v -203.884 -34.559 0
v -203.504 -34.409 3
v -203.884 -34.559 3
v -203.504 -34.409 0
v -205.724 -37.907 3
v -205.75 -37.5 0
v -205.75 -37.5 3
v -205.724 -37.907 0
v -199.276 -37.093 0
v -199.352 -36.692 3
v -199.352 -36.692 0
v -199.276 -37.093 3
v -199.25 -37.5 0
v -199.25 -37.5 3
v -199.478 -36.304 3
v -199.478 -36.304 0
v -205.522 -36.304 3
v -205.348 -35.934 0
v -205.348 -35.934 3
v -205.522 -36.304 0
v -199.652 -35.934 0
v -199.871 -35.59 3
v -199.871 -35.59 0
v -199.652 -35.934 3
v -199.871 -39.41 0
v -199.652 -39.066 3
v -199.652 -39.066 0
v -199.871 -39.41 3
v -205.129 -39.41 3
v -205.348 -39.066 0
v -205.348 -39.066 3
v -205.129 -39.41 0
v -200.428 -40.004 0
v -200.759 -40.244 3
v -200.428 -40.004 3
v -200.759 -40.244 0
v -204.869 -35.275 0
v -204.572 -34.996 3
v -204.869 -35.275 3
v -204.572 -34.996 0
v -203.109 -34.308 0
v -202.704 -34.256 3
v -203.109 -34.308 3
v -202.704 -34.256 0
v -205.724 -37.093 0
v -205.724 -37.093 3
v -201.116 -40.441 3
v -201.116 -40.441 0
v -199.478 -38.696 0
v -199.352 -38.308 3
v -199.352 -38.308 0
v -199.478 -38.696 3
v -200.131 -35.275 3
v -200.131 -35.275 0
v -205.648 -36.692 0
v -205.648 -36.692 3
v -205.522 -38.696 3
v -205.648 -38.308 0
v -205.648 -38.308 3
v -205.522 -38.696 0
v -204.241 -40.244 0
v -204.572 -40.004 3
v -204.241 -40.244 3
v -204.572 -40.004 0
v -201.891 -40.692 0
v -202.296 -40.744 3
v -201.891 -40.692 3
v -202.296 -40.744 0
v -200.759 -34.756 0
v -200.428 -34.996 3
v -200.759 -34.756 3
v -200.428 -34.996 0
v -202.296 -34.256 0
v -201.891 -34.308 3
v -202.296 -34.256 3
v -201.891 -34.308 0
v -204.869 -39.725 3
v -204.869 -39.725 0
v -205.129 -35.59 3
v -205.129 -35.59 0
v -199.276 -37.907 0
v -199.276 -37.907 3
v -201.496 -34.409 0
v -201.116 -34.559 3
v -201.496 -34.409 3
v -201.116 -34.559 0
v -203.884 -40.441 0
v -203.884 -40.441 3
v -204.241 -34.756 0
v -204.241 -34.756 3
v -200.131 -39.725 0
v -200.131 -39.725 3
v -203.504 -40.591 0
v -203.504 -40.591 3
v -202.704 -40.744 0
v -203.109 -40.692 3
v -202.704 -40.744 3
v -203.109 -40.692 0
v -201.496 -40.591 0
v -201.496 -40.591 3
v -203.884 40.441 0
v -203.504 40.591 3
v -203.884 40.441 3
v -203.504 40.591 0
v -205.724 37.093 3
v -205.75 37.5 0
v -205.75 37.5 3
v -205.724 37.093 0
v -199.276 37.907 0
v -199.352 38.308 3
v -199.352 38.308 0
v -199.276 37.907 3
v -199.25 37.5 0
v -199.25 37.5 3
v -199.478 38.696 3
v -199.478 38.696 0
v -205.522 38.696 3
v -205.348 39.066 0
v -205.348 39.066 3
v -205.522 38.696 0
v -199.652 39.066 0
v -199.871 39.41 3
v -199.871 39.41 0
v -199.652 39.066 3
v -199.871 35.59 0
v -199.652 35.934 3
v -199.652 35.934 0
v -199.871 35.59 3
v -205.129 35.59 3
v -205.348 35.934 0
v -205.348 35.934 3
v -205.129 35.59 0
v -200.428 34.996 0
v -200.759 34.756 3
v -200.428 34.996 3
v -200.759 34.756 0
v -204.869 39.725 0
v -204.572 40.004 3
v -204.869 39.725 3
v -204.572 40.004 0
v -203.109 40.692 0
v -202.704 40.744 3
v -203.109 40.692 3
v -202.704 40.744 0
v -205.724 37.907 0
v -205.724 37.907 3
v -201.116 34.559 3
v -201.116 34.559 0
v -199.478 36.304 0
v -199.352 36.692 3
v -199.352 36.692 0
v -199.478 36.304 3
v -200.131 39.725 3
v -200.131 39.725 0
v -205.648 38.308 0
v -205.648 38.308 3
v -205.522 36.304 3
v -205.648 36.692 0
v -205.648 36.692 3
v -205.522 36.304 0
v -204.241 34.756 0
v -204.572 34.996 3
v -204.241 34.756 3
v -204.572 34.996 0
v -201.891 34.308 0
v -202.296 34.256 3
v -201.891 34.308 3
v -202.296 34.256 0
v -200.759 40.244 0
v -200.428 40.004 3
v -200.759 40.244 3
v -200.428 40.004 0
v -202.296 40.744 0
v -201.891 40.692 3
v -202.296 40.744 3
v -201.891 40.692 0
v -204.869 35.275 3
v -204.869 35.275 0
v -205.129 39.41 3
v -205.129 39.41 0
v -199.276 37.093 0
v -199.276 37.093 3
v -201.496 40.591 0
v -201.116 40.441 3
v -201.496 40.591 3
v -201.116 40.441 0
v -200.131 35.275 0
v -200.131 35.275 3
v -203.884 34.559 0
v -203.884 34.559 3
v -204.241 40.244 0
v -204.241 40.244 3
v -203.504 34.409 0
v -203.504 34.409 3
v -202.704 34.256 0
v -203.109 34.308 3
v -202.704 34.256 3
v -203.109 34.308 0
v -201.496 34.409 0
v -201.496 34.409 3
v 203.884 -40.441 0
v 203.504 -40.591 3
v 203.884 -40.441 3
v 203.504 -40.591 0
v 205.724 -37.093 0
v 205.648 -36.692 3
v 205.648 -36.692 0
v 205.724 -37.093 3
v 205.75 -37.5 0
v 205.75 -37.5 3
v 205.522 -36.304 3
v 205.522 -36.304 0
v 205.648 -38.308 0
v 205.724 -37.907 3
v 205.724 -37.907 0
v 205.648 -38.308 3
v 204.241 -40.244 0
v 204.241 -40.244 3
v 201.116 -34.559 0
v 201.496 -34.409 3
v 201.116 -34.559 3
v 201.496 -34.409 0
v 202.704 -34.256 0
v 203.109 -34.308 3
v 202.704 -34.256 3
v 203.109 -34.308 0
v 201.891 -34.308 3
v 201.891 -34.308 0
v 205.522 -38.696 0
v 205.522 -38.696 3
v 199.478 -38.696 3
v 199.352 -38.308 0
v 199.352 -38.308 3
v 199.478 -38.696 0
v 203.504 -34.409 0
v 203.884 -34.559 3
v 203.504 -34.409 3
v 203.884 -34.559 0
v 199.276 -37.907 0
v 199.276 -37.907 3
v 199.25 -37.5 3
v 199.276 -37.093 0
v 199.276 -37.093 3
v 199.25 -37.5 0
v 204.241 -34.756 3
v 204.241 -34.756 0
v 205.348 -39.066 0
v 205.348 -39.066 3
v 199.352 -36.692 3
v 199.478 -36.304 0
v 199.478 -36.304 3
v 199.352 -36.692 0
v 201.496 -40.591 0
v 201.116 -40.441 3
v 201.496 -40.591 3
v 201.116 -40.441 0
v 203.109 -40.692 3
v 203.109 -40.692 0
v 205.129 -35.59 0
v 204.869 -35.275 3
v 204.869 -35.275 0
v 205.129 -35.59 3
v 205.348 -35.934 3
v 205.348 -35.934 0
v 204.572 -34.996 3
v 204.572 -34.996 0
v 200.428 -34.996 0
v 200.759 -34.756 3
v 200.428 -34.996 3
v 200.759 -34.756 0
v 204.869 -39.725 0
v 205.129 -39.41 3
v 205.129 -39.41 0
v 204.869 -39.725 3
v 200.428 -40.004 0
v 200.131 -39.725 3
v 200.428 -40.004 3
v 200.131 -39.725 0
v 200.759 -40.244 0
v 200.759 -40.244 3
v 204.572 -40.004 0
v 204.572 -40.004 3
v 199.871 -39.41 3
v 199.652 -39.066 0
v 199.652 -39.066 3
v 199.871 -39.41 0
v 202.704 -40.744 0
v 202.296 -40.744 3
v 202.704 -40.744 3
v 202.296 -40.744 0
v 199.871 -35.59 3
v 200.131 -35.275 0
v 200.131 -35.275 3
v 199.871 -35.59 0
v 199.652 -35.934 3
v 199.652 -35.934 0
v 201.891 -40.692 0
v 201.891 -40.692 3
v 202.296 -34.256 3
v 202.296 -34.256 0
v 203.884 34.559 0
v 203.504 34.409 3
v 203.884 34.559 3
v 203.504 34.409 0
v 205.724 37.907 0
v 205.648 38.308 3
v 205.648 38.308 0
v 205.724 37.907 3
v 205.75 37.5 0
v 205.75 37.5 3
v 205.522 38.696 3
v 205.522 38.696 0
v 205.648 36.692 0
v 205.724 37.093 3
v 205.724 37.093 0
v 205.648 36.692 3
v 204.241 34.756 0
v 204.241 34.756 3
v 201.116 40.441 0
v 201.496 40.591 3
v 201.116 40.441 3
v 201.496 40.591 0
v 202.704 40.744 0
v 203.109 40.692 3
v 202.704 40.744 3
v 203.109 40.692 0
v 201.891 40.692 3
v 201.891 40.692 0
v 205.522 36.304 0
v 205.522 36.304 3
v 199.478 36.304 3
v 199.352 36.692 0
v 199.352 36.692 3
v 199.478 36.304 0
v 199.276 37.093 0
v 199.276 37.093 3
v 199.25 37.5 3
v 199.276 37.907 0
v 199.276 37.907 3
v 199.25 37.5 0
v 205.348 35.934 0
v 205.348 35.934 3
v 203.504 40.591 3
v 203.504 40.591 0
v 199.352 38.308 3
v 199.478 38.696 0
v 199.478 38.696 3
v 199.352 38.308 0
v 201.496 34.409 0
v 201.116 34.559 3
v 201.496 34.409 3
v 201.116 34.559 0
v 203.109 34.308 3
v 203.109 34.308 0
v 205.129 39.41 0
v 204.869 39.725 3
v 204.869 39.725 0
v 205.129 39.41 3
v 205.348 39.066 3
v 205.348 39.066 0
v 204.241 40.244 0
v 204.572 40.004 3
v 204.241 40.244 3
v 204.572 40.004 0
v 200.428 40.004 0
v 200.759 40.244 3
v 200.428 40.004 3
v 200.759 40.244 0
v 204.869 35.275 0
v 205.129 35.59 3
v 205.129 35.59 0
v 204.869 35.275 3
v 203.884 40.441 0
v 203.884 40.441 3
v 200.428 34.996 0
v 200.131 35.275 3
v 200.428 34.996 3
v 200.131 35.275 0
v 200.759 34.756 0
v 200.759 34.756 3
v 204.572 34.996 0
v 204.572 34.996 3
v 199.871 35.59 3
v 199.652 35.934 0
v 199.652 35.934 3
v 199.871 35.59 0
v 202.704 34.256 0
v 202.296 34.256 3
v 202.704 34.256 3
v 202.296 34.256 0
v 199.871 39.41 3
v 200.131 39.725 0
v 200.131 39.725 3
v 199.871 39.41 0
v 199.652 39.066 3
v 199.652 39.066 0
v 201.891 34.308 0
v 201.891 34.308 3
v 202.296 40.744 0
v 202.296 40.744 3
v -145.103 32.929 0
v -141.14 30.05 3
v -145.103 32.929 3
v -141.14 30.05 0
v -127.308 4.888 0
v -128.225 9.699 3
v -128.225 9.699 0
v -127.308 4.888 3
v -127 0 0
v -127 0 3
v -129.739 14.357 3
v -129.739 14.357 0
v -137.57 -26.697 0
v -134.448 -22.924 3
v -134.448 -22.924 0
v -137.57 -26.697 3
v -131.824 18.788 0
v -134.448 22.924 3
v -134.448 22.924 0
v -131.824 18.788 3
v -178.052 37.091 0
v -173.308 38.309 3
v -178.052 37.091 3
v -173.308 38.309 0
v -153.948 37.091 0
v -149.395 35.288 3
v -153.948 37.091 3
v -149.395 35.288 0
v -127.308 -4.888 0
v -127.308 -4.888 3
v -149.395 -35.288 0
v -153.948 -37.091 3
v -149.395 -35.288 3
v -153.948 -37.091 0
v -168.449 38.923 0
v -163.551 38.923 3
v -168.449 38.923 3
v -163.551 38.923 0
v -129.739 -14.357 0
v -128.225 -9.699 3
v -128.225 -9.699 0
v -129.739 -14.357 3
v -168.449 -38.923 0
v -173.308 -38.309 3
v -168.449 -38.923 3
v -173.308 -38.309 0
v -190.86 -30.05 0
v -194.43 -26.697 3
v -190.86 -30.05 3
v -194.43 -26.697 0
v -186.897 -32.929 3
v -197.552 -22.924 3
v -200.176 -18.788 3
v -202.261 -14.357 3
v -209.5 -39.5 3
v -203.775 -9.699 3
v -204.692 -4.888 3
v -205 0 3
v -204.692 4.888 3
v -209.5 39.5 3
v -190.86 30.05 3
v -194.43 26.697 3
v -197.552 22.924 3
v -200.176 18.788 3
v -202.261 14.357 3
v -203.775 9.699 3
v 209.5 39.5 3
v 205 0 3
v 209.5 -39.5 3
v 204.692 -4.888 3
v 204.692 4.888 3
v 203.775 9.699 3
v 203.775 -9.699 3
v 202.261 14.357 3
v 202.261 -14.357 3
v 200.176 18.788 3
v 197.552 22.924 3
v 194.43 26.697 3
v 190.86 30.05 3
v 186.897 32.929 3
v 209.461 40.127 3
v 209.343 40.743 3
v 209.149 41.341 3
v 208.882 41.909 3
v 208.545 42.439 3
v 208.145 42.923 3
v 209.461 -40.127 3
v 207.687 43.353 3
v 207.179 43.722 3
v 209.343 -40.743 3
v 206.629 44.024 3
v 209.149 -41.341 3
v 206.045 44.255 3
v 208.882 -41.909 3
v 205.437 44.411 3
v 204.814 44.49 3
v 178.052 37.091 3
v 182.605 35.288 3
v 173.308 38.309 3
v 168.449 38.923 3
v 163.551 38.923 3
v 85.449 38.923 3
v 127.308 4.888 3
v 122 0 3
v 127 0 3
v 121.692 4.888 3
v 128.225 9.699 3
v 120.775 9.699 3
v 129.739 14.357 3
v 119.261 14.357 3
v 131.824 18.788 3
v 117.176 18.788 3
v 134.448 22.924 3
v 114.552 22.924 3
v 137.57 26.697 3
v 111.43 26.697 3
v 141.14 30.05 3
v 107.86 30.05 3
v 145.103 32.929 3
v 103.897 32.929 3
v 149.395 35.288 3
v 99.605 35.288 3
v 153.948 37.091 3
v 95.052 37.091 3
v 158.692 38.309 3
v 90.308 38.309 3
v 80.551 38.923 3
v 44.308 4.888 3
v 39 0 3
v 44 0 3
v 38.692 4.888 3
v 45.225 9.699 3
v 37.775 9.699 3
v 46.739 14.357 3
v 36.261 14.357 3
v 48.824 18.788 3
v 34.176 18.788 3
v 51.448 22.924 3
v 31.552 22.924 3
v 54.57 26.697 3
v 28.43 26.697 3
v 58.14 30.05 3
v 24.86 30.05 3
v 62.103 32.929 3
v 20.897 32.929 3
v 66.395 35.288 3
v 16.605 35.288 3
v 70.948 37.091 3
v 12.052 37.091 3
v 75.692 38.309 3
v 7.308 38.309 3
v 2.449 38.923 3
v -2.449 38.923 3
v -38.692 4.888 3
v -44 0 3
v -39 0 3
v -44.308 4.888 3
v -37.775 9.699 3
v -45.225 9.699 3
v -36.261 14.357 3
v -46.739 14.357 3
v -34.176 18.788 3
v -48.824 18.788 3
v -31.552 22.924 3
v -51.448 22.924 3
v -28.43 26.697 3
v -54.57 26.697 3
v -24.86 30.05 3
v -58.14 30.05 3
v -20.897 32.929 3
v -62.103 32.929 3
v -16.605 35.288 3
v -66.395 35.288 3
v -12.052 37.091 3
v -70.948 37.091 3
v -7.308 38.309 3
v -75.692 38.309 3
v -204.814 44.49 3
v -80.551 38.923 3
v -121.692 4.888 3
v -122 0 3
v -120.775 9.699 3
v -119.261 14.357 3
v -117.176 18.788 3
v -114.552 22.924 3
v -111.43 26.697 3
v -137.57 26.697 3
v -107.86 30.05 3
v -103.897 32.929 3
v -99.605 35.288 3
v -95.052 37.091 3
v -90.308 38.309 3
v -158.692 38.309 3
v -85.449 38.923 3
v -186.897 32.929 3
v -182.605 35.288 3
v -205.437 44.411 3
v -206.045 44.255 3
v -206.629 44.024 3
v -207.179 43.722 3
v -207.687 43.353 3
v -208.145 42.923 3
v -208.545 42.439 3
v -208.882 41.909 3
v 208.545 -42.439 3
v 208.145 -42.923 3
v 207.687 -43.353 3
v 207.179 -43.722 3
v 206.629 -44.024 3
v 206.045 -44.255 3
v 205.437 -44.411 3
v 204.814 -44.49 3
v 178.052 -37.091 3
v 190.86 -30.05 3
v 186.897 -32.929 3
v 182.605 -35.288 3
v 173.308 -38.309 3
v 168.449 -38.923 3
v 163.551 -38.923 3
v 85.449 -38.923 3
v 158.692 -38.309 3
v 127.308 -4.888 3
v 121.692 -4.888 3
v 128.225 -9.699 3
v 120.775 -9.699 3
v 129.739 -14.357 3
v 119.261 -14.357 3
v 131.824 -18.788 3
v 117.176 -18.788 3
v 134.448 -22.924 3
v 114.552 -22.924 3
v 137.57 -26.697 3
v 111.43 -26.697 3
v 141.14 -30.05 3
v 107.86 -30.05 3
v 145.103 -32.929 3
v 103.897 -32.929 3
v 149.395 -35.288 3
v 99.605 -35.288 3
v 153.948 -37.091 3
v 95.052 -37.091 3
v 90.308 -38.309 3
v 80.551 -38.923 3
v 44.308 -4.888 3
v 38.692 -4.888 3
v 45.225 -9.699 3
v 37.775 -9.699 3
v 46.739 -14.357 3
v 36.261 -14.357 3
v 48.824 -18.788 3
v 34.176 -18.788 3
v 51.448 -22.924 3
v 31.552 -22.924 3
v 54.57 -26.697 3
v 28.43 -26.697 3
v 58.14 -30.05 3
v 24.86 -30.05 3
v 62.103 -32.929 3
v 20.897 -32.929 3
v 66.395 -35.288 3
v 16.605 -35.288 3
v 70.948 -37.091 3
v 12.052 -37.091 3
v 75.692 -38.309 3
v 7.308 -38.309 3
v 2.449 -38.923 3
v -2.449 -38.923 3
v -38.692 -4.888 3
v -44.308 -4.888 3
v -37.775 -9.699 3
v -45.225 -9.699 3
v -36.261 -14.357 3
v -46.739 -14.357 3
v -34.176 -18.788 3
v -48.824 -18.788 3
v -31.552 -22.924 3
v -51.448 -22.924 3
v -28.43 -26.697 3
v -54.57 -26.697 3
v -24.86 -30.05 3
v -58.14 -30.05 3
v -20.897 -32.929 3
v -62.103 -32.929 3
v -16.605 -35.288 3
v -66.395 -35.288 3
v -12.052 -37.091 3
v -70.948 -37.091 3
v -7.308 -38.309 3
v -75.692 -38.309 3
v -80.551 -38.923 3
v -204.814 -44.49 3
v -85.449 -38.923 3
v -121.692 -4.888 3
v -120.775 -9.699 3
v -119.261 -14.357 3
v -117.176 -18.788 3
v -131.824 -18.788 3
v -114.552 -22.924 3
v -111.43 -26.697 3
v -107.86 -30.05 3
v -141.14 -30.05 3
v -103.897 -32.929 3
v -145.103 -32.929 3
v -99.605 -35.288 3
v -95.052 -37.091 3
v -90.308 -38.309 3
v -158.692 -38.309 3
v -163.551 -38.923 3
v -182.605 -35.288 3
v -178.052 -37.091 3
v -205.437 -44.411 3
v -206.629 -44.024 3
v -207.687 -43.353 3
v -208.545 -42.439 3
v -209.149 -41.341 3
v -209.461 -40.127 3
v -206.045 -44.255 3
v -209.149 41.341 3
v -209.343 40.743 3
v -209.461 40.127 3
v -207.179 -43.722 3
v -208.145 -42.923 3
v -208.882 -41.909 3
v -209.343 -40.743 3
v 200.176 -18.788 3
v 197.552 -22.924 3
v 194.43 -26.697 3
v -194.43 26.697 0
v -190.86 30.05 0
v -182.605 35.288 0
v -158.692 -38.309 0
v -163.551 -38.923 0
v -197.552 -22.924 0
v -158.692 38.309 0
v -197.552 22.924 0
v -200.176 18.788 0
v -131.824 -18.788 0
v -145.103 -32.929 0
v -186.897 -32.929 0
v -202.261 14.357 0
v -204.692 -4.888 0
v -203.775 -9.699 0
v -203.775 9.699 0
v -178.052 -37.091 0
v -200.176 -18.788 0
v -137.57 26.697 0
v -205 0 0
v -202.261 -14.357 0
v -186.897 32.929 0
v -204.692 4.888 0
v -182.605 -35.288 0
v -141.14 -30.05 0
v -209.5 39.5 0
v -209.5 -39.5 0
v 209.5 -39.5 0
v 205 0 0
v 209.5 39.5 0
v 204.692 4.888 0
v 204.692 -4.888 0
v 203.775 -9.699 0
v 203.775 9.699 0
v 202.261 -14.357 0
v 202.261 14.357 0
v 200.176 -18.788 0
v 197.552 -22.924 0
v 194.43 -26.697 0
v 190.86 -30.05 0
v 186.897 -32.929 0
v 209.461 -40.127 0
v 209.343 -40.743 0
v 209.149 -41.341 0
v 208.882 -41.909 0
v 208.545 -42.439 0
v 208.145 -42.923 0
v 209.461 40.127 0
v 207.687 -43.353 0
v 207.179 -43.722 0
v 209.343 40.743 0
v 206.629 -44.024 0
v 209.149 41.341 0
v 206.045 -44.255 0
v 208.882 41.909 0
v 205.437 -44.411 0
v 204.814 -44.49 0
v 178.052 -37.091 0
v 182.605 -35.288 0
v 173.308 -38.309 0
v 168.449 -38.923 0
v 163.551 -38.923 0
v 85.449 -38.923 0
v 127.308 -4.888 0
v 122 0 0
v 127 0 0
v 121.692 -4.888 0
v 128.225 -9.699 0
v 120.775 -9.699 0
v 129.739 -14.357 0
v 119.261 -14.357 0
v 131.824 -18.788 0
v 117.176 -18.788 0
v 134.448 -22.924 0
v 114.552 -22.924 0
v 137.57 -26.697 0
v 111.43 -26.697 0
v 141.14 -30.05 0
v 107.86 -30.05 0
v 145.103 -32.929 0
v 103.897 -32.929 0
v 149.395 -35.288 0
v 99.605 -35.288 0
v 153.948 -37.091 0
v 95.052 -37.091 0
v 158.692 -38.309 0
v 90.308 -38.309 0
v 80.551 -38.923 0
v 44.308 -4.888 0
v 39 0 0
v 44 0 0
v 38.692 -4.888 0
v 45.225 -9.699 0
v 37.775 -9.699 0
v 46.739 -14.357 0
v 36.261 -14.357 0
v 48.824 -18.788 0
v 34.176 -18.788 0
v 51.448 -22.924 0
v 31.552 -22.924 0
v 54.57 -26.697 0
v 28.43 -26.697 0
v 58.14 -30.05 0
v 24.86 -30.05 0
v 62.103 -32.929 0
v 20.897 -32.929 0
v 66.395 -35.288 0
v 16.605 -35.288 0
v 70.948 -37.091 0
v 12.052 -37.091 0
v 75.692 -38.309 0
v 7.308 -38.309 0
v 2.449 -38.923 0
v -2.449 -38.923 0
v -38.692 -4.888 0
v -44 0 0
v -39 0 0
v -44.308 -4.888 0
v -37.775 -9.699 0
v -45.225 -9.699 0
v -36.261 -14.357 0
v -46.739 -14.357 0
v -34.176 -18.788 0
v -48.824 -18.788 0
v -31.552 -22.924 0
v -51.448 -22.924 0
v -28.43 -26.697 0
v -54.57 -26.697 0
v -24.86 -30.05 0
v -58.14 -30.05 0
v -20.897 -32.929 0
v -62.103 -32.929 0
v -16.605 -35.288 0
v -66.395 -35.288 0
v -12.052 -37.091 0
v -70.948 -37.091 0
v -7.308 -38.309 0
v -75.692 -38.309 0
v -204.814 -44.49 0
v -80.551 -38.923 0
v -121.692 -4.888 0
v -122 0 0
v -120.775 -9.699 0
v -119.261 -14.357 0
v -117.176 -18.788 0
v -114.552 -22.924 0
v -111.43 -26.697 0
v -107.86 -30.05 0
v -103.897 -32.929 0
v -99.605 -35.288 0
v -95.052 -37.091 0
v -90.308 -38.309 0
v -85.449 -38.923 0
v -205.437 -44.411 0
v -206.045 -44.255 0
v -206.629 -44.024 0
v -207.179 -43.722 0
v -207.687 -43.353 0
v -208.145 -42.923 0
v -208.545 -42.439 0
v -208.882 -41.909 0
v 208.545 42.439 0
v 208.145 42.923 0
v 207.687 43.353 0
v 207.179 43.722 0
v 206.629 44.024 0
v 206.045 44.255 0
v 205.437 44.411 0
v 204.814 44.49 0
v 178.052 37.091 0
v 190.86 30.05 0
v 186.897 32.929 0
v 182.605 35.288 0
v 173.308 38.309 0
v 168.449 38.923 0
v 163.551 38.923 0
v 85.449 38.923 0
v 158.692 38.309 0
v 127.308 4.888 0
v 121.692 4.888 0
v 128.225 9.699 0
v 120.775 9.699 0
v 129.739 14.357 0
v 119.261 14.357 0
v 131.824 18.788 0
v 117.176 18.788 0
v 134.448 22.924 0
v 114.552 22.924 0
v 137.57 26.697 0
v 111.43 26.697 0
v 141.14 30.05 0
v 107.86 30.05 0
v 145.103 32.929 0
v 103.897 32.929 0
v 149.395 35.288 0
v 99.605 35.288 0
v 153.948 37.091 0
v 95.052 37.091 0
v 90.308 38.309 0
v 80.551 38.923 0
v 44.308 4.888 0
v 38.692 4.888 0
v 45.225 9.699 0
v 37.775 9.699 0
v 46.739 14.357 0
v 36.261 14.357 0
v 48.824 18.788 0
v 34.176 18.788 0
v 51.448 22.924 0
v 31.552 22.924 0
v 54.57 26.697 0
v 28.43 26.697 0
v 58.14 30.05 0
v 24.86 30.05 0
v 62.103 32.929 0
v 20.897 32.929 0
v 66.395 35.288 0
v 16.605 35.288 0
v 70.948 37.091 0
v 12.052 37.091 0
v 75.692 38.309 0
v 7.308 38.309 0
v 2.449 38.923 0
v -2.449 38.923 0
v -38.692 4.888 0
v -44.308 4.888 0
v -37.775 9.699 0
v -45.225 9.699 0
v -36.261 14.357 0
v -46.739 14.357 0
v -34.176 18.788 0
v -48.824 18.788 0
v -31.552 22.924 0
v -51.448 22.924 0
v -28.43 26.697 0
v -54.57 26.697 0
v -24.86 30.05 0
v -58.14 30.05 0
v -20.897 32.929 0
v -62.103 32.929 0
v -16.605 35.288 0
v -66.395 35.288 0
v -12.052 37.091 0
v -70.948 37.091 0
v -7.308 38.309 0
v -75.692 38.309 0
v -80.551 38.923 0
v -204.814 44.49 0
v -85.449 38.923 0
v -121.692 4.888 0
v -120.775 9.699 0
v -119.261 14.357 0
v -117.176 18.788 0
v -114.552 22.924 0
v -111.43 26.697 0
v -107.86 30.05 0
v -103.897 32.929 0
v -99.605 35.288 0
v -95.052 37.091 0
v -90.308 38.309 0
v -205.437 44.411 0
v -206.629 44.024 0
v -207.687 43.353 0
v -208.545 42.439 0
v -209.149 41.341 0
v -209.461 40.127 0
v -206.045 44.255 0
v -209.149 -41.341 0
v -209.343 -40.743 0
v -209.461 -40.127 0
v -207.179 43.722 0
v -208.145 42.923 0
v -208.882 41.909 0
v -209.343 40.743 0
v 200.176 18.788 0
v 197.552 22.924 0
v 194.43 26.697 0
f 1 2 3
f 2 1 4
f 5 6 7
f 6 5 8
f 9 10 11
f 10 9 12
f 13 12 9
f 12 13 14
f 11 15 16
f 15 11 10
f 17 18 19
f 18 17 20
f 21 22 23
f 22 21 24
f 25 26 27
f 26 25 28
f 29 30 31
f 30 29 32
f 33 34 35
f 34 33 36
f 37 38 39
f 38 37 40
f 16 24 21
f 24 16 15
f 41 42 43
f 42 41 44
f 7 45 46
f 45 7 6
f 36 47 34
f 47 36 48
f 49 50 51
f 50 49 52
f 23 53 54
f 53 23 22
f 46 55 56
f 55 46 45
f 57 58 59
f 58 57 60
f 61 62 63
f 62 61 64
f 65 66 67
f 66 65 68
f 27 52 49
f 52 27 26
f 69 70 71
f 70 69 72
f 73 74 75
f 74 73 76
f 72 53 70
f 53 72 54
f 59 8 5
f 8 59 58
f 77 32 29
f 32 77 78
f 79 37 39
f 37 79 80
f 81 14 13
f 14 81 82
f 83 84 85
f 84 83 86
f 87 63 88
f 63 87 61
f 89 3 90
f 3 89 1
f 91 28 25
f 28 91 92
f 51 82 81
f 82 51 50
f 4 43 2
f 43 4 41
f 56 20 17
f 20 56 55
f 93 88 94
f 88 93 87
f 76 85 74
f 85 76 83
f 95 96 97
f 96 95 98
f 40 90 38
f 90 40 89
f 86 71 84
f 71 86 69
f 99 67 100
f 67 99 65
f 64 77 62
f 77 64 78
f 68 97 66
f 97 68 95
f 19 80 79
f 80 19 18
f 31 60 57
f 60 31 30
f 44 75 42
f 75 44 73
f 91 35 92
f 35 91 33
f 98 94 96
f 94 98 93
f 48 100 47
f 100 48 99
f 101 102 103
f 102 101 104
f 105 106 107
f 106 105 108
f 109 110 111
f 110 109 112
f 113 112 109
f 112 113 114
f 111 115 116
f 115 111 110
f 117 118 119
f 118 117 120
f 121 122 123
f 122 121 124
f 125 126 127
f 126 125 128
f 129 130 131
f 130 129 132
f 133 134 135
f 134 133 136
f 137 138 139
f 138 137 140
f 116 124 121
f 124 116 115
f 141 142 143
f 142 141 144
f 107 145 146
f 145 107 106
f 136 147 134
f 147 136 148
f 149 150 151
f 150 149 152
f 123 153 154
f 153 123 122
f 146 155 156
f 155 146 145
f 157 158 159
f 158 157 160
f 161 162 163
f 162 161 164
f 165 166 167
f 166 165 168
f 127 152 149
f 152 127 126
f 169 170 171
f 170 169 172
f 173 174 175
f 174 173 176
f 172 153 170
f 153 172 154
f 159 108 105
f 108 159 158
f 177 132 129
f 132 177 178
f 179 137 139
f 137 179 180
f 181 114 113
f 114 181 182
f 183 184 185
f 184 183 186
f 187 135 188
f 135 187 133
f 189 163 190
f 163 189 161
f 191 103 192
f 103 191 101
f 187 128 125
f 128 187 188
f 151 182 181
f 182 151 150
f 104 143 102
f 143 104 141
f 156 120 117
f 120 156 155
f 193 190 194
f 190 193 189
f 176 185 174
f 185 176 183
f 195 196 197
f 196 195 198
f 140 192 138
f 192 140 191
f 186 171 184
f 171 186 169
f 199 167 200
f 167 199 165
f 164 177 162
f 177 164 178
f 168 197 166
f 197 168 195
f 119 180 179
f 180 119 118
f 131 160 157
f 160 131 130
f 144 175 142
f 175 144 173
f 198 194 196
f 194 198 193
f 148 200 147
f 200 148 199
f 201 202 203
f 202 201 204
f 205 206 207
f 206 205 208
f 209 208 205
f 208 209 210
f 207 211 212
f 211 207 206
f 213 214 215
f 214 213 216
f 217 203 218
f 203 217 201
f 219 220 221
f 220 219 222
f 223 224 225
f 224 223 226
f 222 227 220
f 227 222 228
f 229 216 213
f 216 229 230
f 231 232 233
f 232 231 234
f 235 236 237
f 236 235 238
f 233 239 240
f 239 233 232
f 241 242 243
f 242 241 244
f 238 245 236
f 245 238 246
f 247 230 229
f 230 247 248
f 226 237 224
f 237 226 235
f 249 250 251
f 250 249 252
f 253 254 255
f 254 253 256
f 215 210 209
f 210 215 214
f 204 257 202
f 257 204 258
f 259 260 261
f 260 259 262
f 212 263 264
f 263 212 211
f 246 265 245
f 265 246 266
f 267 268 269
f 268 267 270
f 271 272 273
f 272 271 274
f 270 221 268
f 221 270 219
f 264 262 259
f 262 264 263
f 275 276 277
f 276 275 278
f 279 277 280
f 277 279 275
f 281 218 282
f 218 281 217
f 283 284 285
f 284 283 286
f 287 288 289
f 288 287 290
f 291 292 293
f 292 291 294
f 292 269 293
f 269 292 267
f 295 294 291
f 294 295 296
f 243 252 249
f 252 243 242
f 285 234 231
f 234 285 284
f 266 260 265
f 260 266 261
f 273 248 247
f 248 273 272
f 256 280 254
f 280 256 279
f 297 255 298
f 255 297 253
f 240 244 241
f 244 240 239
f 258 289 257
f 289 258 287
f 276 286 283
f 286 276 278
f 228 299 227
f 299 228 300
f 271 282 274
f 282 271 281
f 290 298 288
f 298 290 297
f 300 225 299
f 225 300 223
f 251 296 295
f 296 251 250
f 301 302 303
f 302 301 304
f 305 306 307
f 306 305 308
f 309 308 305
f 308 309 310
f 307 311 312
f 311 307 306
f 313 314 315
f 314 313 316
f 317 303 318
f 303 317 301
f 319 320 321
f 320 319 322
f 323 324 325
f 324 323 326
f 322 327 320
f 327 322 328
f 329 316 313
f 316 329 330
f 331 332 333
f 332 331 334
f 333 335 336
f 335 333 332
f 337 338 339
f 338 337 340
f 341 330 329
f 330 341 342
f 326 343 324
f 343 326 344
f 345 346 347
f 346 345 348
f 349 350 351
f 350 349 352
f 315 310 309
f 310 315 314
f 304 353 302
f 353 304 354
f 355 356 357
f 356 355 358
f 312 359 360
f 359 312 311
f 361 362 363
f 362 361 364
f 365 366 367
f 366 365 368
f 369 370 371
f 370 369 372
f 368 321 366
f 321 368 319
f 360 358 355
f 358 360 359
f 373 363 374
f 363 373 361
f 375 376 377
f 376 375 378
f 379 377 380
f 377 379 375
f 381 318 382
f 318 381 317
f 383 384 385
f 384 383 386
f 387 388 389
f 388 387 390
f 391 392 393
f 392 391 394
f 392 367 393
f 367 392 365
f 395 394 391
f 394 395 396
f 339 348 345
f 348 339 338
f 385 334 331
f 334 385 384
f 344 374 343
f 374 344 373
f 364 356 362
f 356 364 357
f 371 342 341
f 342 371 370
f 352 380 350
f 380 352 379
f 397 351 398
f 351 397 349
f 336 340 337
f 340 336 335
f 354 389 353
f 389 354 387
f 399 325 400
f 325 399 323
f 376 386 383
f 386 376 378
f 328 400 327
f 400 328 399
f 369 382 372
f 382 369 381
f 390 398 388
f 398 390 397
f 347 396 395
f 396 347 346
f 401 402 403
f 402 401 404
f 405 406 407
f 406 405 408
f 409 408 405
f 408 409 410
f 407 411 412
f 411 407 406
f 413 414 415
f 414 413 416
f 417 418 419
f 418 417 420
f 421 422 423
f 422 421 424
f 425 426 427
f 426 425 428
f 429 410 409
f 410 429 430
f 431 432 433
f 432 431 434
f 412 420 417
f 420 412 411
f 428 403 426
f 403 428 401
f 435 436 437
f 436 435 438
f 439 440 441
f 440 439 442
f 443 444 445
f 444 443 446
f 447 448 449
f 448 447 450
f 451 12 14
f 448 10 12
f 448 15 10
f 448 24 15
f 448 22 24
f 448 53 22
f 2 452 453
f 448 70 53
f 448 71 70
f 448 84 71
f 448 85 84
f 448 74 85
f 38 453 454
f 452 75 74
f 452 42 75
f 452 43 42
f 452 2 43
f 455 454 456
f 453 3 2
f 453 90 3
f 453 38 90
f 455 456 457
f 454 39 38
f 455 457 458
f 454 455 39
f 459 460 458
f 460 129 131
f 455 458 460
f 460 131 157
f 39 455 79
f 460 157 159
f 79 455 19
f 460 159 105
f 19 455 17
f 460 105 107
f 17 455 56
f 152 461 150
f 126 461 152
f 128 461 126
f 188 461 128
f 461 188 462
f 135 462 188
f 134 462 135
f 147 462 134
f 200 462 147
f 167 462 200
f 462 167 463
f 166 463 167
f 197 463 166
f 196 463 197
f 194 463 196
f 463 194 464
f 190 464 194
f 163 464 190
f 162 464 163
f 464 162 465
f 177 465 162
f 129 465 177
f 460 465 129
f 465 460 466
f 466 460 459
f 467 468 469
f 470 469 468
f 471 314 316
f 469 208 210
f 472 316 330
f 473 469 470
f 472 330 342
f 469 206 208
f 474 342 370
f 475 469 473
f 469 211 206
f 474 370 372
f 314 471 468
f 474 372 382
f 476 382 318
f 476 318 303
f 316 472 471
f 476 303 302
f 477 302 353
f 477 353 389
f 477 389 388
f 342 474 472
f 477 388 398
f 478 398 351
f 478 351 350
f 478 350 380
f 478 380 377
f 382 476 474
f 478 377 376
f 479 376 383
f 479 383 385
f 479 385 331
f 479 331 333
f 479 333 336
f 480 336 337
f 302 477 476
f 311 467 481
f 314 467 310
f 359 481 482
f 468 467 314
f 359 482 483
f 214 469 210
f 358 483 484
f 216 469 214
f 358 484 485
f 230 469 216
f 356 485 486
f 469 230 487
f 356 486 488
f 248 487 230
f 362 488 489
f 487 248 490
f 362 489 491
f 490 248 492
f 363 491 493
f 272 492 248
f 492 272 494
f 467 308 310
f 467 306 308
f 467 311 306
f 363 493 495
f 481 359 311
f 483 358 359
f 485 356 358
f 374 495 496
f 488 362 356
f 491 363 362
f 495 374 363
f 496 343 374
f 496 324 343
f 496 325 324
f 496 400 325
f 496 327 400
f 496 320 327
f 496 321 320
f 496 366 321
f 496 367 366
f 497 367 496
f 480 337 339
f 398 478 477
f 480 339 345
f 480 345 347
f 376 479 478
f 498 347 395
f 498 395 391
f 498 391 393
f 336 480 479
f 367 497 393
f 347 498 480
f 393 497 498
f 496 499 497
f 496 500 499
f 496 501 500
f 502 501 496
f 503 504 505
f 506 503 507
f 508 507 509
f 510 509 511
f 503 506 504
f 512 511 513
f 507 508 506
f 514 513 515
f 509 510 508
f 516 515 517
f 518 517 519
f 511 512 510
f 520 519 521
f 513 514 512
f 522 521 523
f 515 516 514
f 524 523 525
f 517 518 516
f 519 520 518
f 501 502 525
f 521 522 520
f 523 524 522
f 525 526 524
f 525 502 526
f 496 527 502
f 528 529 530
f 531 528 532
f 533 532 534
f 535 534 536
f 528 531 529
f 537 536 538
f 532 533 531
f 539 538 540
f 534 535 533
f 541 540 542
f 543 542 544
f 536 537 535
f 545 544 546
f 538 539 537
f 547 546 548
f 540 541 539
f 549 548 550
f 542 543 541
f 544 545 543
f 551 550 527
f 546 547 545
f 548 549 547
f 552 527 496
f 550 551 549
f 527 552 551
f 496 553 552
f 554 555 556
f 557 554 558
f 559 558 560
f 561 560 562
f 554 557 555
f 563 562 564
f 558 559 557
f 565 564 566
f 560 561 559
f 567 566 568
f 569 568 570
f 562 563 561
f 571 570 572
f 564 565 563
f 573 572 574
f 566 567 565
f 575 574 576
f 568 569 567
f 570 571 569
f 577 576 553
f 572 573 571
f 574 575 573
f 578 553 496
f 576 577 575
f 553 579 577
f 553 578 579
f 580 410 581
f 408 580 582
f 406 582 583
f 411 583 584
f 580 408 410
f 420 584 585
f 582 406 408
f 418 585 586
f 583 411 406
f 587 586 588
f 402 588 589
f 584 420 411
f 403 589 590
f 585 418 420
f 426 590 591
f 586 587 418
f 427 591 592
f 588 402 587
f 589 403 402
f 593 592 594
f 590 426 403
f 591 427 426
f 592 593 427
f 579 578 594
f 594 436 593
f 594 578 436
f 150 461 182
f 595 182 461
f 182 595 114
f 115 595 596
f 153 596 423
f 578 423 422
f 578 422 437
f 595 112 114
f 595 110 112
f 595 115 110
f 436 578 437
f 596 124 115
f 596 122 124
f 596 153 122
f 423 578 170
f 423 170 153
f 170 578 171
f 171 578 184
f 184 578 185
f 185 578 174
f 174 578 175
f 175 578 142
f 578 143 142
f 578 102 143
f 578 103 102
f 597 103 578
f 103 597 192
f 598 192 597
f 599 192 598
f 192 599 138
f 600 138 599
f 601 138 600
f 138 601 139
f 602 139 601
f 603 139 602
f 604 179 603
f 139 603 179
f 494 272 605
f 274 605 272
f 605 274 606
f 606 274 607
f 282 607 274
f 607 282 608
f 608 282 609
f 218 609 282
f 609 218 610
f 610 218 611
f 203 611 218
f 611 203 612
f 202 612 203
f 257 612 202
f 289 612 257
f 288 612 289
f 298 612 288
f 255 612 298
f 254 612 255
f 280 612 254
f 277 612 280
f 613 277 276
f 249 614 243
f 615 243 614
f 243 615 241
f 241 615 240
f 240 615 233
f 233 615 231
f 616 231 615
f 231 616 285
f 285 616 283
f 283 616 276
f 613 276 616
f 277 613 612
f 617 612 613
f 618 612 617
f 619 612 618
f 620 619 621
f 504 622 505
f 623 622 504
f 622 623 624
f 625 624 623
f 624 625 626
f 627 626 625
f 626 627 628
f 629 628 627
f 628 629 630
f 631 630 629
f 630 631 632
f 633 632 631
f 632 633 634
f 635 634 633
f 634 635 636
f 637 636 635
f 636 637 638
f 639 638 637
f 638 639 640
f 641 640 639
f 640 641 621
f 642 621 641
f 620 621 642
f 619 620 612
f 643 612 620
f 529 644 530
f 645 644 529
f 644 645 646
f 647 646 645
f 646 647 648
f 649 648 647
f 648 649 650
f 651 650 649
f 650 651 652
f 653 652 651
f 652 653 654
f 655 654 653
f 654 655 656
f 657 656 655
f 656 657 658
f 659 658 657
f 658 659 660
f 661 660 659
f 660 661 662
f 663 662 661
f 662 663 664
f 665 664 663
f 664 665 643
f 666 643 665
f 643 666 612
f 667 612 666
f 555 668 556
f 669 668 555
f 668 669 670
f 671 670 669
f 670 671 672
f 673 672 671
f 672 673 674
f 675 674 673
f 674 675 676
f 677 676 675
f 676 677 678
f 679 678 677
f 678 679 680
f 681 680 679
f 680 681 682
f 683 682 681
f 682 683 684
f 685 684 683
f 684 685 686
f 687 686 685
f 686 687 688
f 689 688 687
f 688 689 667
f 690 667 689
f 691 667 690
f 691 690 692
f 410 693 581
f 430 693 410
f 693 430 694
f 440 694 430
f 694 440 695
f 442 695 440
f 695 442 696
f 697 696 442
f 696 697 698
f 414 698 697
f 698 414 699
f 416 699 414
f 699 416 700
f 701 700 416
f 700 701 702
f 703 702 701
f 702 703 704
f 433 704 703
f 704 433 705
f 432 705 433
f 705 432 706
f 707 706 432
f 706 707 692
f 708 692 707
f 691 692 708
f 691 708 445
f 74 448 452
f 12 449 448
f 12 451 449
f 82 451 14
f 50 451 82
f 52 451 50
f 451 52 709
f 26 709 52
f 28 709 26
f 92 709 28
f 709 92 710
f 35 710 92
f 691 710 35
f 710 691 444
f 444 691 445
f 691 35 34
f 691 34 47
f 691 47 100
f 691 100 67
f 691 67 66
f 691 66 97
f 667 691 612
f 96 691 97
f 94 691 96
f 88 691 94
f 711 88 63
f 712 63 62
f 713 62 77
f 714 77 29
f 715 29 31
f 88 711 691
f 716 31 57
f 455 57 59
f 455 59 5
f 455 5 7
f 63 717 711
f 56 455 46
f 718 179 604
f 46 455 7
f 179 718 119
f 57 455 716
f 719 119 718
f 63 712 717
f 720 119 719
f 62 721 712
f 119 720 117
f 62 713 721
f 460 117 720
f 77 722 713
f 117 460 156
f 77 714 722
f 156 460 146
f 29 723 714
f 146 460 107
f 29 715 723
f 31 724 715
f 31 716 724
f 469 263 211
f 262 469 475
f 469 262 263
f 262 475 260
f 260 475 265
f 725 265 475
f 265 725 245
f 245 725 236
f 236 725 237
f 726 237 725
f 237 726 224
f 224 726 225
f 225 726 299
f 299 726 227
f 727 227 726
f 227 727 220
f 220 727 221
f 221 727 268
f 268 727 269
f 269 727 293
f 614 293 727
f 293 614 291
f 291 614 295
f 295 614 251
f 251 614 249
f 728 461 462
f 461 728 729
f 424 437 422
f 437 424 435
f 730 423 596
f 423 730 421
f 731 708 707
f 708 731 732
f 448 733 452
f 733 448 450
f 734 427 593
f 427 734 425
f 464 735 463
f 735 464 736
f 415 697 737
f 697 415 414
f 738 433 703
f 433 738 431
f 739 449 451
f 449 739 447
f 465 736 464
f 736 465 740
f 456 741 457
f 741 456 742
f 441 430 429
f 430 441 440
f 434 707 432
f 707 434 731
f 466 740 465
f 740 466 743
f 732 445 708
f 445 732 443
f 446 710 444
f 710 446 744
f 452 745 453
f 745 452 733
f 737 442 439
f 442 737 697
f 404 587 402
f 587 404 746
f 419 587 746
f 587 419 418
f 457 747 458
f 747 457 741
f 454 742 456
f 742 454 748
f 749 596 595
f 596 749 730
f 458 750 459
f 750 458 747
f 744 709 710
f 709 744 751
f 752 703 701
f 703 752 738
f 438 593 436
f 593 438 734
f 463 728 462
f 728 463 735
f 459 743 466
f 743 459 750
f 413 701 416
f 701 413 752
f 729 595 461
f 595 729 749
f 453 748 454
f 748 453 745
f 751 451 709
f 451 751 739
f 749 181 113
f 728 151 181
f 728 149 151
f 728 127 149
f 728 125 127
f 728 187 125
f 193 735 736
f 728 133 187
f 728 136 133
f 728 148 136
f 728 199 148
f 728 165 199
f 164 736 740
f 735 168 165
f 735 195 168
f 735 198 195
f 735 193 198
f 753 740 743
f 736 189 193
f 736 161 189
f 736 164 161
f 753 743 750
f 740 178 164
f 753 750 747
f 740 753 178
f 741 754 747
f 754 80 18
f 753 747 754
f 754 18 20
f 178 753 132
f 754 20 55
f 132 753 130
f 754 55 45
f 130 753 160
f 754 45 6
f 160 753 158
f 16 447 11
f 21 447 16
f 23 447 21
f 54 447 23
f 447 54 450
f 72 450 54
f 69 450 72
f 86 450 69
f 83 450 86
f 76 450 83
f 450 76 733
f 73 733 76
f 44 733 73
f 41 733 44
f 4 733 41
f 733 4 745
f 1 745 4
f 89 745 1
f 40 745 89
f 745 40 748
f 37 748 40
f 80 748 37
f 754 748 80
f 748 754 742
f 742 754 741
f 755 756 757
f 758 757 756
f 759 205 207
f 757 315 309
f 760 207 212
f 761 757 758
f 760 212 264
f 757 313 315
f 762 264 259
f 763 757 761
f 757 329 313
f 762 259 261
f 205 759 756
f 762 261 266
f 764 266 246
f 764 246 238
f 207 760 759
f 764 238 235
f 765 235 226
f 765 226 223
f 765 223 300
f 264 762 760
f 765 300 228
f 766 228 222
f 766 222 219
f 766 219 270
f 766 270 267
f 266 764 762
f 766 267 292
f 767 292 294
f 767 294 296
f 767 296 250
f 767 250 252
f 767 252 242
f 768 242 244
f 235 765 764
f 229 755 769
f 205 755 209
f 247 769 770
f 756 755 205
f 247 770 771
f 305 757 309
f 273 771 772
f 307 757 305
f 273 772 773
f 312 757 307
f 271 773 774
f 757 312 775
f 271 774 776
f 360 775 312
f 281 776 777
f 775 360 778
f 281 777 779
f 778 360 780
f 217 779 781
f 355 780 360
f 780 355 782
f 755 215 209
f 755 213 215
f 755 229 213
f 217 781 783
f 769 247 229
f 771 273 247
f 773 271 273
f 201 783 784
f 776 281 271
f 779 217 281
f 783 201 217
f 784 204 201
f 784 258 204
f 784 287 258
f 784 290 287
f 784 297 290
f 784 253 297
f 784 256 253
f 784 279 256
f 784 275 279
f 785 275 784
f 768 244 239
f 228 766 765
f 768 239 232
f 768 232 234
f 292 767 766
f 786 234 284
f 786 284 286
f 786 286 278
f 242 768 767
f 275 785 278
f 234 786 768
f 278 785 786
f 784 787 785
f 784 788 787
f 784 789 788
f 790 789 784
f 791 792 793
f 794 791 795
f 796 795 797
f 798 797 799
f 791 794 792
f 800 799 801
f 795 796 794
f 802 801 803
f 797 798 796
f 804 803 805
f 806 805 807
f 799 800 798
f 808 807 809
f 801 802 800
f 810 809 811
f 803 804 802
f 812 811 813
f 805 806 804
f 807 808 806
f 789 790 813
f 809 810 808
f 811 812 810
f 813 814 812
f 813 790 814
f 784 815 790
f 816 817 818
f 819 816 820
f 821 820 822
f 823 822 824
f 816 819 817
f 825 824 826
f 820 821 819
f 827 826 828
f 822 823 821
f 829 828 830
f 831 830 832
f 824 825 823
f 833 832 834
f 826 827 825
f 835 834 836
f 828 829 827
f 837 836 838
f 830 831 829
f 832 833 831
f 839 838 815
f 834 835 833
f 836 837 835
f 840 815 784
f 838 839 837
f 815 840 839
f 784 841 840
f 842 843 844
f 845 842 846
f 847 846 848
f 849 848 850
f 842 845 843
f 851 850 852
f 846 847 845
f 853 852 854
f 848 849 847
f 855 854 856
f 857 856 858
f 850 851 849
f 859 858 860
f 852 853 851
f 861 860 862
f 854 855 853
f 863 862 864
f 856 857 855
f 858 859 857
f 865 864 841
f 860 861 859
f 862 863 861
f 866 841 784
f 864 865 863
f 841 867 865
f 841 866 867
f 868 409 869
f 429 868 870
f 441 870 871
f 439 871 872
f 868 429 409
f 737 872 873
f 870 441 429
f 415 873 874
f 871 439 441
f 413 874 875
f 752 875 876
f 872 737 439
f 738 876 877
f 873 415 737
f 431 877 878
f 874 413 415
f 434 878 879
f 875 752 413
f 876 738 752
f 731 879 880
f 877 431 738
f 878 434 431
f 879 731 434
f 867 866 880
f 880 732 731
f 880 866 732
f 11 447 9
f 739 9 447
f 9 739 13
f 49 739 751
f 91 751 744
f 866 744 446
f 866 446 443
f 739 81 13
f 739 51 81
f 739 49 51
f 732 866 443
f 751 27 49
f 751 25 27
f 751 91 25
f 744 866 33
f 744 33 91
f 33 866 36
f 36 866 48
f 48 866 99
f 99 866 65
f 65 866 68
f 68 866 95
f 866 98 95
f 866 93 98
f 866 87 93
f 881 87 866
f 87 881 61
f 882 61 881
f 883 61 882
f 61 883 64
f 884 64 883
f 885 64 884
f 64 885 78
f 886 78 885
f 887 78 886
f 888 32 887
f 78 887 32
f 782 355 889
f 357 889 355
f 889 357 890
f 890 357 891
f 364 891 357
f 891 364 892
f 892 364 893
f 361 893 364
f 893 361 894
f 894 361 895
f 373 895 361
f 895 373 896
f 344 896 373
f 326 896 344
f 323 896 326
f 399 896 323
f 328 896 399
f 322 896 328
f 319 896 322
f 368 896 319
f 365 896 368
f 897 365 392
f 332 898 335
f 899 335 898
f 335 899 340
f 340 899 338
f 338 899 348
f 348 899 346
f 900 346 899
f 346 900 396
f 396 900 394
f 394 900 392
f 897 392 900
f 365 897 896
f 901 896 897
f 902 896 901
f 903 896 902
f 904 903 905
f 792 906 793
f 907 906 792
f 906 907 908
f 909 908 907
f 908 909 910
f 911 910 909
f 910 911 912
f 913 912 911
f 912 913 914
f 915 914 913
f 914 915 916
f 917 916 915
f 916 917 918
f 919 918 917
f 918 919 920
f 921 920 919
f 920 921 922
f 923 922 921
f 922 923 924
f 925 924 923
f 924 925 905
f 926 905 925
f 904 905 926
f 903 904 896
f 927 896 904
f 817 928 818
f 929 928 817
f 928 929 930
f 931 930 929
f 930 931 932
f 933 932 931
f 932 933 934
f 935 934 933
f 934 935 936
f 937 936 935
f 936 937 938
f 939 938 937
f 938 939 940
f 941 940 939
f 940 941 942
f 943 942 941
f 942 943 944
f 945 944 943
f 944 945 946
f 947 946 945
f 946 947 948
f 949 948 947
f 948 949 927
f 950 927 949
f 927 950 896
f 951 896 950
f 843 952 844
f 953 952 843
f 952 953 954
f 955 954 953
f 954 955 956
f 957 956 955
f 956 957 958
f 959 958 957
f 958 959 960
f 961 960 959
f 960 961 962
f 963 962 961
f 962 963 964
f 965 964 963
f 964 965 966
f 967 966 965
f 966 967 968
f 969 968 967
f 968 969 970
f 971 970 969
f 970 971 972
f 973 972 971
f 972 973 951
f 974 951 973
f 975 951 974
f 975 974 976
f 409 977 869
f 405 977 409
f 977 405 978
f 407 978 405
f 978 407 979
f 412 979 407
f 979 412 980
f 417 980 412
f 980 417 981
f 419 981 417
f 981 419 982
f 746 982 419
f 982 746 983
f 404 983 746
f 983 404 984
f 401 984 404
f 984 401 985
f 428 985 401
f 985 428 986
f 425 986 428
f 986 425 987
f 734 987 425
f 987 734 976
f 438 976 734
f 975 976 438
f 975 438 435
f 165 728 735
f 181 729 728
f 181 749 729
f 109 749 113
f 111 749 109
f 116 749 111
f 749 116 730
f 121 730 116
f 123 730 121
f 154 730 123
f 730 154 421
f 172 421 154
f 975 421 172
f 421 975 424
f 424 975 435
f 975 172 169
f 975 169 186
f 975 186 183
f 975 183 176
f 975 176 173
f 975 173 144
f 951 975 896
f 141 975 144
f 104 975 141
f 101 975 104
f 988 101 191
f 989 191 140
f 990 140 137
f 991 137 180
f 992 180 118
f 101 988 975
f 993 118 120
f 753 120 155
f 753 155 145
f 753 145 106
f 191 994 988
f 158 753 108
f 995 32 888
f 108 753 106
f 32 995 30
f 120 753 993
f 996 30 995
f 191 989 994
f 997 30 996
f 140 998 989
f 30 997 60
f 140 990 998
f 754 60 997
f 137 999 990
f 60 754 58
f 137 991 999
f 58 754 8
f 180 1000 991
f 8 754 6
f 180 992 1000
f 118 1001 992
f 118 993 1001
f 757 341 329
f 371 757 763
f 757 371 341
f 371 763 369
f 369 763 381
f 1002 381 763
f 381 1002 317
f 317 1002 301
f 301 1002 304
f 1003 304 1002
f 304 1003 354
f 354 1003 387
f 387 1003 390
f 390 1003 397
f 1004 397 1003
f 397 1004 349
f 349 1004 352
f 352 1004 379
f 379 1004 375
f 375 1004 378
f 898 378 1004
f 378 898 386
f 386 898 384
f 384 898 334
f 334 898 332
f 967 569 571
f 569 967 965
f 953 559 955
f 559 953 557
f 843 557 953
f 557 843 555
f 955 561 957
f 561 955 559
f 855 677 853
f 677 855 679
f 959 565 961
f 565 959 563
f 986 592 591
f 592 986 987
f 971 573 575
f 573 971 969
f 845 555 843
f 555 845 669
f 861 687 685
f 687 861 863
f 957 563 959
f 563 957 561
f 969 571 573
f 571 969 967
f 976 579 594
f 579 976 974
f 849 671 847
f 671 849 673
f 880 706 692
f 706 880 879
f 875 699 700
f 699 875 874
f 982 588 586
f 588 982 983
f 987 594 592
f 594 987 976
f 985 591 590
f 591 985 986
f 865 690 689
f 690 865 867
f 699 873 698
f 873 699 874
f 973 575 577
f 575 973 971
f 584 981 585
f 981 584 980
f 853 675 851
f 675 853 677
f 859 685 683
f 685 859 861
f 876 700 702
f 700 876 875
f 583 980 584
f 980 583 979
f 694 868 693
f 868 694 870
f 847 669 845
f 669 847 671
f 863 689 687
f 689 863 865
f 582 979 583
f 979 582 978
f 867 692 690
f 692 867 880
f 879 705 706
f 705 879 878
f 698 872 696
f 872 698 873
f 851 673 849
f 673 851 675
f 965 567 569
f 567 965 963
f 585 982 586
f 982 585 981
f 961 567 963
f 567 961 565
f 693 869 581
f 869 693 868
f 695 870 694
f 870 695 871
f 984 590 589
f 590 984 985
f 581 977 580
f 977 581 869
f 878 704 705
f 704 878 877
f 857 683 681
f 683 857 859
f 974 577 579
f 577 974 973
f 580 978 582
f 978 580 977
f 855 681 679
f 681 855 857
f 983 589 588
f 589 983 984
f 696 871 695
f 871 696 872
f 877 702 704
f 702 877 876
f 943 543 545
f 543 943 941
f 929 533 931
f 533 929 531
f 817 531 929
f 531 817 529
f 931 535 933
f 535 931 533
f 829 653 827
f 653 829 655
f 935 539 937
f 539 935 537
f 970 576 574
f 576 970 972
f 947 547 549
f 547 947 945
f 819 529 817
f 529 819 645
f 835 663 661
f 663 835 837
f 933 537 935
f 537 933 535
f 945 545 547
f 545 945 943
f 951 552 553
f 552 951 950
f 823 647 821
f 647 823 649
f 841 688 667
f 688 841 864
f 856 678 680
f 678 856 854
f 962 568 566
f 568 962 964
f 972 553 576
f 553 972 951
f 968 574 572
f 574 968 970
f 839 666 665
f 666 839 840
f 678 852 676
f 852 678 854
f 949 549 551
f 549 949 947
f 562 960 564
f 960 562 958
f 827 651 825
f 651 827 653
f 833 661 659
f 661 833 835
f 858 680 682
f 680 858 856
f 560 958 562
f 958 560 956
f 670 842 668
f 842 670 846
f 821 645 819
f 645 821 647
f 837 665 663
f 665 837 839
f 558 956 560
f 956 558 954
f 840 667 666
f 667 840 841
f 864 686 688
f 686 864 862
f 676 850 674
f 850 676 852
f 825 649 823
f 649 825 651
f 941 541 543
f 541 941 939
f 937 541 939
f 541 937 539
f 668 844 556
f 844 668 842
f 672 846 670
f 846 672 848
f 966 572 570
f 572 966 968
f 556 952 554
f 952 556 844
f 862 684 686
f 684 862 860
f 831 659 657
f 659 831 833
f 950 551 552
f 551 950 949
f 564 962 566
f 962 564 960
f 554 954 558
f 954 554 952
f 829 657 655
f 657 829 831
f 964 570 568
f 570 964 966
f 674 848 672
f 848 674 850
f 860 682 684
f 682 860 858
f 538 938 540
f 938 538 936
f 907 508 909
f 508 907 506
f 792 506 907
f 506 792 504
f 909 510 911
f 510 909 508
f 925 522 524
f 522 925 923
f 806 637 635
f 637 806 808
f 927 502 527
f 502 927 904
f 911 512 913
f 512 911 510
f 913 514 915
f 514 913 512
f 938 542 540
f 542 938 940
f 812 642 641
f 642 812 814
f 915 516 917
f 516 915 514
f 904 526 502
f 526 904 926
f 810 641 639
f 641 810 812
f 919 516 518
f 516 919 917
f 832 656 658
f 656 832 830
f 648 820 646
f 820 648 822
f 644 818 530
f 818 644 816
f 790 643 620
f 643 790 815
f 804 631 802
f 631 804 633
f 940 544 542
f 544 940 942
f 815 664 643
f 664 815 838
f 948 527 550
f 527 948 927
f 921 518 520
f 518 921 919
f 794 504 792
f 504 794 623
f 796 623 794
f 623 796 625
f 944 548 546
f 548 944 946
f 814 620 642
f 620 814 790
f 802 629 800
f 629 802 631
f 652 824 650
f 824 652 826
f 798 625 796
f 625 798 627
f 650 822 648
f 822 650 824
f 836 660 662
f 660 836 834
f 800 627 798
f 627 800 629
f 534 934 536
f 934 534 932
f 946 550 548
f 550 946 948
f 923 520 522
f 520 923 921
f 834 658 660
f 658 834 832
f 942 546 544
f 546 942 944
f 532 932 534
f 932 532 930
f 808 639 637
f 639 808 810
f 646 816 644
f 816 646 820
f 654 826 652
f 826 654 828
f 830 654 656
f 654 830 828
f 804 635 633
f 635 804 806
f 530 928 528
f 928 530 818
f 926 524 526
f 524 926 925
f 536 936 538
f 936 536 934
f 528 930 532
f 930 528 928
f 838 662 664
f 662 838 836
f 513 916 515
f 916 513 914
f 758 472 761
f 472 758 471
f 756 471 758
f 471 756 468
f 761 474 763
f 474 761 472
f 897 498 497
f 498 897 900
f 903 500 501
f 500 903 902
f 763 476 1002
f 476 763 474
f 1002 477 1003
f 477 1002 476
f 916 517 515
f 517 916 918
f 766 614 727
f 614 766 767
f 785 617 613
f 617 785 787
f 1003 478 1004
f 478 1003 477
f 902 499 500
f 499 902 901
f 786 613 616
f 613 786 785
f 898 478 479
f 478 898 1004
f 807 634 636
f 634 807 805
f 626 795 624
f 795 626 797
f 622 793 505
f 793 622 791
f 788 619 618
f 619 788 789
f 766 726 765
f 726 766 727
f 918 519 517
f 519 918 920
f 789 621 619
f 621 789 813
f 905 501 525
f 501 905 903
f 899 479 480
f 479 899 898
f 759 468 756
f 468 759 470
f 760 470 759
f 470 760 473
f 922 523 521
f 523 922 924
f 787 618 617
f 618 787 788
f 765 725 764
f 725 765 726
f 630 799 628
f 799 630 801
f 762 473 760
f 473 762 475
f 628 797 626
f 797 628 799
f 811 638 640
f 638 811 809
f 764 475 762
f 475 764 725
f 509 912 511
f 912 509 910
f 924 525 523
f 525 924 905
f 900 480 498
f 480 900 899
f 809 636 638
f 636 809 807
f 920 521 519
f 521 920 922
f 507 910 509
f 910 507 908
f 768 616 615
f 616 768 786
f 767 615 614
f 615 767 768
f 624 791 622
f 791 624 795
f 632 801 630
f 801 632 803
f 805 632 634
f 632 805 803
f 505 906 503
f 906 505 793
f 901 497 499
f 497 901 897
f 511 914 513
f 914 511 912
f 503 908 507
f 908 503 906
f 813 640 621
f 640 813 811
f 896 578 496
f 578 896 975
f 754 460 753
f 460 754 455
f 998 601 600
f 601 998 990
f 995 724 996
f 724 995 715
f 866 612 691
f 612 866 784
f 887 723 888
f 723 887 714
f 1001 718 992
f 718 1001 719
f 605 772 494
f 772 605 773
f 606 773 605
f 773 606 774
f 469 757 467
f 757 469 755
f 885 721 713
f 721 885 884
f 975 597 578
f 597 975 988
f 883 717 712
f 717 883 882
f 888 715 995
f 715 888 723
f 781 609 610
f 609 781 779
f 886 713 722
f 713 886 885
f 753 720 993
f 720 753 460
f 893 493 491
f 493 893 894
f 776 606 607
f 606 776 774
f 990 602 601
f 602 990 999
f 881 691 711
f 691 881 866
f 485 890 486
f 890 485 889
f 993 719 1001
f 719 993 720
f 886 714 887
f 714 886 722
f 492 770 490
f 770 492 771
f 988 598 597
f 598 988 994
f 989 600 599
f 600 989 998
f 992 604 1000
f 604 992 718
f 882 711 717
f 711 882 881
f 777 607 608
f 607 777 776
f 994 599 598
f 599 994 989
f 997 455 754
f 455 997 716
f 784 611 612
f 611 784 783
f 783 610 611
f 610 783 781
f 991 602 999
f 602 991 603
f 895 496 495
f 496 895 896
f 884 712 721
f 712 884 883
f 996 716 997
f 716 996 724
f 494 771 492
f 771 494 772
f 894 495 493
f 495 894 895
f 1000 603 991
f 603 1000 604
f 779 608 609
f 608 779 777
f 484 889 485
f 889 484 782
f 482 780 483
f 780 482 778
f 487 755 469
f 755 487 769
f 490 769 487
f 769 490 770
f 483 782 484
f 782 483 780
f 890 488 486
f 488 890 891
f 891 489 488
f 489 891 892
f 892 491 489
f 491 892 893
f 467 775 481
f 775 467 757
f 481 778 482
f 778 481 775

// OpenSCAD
$fn = 50;


difference() {
	union() {
		hull() {
			translate(v = [-204.5000000000, 39.5000000000, 0]) {
				cylinder(h = 3, r = 5);
			}
			translate(v = [204.5000000000, 39.5000000000, 0]) {
				cylinder(h = 3, r = 5);
			}
			translate(v = [-204.5000000000, -39.5000000000, 0]) {
				cylinder(h = 3, r = 5);
			}
			translate(v = [204.5000000000, -39.5000000000, 0]) {
				cylinder(h = 3, r = 5);
			}
		}
	}
	union() {
		#translate(v = [-202.5000000000, -37.5000000000, -100.0000000000]) {
			cylinder(h = 200, r = 3.2500000000);
		}
		#translate(v = [-202.5000000000, 37.5000000000, -100.0000000000]) {
			cylinder(h = 200, r = 3.2500000000);
		}
		#translate(v = [202.5000000000, -37.5000000000, -100.0000000000]) {
			cylinder(h = 200, r = 3.2500000000);
		}
		#translate(v = [202.5000000000, 37.5000000000, -100.0000000000]) {
			cylinder(h = 200, r = 3.2500000000);
		}
		#translate(v = [-166.0000000000, 0, 0]) {
			cylinder(h = 3, r = 39.0000000000);
		}
		#translate(v = [-83.0000000000, 0, 0]) {
			cylinder(h = 3, r = 39.0000000000);
		}
		#cylinder(h = 3, r = 39.0000000000);
		#translate(v = [83.0000000000, 0, 0]) {
			cylinder(h = 3, r = 39.0000000000);
		}
		#translate(v = [166.0000000000, 0, 0]) {
			cylinder(h = 3, r = 39.0000000000);
		}
	}
}
